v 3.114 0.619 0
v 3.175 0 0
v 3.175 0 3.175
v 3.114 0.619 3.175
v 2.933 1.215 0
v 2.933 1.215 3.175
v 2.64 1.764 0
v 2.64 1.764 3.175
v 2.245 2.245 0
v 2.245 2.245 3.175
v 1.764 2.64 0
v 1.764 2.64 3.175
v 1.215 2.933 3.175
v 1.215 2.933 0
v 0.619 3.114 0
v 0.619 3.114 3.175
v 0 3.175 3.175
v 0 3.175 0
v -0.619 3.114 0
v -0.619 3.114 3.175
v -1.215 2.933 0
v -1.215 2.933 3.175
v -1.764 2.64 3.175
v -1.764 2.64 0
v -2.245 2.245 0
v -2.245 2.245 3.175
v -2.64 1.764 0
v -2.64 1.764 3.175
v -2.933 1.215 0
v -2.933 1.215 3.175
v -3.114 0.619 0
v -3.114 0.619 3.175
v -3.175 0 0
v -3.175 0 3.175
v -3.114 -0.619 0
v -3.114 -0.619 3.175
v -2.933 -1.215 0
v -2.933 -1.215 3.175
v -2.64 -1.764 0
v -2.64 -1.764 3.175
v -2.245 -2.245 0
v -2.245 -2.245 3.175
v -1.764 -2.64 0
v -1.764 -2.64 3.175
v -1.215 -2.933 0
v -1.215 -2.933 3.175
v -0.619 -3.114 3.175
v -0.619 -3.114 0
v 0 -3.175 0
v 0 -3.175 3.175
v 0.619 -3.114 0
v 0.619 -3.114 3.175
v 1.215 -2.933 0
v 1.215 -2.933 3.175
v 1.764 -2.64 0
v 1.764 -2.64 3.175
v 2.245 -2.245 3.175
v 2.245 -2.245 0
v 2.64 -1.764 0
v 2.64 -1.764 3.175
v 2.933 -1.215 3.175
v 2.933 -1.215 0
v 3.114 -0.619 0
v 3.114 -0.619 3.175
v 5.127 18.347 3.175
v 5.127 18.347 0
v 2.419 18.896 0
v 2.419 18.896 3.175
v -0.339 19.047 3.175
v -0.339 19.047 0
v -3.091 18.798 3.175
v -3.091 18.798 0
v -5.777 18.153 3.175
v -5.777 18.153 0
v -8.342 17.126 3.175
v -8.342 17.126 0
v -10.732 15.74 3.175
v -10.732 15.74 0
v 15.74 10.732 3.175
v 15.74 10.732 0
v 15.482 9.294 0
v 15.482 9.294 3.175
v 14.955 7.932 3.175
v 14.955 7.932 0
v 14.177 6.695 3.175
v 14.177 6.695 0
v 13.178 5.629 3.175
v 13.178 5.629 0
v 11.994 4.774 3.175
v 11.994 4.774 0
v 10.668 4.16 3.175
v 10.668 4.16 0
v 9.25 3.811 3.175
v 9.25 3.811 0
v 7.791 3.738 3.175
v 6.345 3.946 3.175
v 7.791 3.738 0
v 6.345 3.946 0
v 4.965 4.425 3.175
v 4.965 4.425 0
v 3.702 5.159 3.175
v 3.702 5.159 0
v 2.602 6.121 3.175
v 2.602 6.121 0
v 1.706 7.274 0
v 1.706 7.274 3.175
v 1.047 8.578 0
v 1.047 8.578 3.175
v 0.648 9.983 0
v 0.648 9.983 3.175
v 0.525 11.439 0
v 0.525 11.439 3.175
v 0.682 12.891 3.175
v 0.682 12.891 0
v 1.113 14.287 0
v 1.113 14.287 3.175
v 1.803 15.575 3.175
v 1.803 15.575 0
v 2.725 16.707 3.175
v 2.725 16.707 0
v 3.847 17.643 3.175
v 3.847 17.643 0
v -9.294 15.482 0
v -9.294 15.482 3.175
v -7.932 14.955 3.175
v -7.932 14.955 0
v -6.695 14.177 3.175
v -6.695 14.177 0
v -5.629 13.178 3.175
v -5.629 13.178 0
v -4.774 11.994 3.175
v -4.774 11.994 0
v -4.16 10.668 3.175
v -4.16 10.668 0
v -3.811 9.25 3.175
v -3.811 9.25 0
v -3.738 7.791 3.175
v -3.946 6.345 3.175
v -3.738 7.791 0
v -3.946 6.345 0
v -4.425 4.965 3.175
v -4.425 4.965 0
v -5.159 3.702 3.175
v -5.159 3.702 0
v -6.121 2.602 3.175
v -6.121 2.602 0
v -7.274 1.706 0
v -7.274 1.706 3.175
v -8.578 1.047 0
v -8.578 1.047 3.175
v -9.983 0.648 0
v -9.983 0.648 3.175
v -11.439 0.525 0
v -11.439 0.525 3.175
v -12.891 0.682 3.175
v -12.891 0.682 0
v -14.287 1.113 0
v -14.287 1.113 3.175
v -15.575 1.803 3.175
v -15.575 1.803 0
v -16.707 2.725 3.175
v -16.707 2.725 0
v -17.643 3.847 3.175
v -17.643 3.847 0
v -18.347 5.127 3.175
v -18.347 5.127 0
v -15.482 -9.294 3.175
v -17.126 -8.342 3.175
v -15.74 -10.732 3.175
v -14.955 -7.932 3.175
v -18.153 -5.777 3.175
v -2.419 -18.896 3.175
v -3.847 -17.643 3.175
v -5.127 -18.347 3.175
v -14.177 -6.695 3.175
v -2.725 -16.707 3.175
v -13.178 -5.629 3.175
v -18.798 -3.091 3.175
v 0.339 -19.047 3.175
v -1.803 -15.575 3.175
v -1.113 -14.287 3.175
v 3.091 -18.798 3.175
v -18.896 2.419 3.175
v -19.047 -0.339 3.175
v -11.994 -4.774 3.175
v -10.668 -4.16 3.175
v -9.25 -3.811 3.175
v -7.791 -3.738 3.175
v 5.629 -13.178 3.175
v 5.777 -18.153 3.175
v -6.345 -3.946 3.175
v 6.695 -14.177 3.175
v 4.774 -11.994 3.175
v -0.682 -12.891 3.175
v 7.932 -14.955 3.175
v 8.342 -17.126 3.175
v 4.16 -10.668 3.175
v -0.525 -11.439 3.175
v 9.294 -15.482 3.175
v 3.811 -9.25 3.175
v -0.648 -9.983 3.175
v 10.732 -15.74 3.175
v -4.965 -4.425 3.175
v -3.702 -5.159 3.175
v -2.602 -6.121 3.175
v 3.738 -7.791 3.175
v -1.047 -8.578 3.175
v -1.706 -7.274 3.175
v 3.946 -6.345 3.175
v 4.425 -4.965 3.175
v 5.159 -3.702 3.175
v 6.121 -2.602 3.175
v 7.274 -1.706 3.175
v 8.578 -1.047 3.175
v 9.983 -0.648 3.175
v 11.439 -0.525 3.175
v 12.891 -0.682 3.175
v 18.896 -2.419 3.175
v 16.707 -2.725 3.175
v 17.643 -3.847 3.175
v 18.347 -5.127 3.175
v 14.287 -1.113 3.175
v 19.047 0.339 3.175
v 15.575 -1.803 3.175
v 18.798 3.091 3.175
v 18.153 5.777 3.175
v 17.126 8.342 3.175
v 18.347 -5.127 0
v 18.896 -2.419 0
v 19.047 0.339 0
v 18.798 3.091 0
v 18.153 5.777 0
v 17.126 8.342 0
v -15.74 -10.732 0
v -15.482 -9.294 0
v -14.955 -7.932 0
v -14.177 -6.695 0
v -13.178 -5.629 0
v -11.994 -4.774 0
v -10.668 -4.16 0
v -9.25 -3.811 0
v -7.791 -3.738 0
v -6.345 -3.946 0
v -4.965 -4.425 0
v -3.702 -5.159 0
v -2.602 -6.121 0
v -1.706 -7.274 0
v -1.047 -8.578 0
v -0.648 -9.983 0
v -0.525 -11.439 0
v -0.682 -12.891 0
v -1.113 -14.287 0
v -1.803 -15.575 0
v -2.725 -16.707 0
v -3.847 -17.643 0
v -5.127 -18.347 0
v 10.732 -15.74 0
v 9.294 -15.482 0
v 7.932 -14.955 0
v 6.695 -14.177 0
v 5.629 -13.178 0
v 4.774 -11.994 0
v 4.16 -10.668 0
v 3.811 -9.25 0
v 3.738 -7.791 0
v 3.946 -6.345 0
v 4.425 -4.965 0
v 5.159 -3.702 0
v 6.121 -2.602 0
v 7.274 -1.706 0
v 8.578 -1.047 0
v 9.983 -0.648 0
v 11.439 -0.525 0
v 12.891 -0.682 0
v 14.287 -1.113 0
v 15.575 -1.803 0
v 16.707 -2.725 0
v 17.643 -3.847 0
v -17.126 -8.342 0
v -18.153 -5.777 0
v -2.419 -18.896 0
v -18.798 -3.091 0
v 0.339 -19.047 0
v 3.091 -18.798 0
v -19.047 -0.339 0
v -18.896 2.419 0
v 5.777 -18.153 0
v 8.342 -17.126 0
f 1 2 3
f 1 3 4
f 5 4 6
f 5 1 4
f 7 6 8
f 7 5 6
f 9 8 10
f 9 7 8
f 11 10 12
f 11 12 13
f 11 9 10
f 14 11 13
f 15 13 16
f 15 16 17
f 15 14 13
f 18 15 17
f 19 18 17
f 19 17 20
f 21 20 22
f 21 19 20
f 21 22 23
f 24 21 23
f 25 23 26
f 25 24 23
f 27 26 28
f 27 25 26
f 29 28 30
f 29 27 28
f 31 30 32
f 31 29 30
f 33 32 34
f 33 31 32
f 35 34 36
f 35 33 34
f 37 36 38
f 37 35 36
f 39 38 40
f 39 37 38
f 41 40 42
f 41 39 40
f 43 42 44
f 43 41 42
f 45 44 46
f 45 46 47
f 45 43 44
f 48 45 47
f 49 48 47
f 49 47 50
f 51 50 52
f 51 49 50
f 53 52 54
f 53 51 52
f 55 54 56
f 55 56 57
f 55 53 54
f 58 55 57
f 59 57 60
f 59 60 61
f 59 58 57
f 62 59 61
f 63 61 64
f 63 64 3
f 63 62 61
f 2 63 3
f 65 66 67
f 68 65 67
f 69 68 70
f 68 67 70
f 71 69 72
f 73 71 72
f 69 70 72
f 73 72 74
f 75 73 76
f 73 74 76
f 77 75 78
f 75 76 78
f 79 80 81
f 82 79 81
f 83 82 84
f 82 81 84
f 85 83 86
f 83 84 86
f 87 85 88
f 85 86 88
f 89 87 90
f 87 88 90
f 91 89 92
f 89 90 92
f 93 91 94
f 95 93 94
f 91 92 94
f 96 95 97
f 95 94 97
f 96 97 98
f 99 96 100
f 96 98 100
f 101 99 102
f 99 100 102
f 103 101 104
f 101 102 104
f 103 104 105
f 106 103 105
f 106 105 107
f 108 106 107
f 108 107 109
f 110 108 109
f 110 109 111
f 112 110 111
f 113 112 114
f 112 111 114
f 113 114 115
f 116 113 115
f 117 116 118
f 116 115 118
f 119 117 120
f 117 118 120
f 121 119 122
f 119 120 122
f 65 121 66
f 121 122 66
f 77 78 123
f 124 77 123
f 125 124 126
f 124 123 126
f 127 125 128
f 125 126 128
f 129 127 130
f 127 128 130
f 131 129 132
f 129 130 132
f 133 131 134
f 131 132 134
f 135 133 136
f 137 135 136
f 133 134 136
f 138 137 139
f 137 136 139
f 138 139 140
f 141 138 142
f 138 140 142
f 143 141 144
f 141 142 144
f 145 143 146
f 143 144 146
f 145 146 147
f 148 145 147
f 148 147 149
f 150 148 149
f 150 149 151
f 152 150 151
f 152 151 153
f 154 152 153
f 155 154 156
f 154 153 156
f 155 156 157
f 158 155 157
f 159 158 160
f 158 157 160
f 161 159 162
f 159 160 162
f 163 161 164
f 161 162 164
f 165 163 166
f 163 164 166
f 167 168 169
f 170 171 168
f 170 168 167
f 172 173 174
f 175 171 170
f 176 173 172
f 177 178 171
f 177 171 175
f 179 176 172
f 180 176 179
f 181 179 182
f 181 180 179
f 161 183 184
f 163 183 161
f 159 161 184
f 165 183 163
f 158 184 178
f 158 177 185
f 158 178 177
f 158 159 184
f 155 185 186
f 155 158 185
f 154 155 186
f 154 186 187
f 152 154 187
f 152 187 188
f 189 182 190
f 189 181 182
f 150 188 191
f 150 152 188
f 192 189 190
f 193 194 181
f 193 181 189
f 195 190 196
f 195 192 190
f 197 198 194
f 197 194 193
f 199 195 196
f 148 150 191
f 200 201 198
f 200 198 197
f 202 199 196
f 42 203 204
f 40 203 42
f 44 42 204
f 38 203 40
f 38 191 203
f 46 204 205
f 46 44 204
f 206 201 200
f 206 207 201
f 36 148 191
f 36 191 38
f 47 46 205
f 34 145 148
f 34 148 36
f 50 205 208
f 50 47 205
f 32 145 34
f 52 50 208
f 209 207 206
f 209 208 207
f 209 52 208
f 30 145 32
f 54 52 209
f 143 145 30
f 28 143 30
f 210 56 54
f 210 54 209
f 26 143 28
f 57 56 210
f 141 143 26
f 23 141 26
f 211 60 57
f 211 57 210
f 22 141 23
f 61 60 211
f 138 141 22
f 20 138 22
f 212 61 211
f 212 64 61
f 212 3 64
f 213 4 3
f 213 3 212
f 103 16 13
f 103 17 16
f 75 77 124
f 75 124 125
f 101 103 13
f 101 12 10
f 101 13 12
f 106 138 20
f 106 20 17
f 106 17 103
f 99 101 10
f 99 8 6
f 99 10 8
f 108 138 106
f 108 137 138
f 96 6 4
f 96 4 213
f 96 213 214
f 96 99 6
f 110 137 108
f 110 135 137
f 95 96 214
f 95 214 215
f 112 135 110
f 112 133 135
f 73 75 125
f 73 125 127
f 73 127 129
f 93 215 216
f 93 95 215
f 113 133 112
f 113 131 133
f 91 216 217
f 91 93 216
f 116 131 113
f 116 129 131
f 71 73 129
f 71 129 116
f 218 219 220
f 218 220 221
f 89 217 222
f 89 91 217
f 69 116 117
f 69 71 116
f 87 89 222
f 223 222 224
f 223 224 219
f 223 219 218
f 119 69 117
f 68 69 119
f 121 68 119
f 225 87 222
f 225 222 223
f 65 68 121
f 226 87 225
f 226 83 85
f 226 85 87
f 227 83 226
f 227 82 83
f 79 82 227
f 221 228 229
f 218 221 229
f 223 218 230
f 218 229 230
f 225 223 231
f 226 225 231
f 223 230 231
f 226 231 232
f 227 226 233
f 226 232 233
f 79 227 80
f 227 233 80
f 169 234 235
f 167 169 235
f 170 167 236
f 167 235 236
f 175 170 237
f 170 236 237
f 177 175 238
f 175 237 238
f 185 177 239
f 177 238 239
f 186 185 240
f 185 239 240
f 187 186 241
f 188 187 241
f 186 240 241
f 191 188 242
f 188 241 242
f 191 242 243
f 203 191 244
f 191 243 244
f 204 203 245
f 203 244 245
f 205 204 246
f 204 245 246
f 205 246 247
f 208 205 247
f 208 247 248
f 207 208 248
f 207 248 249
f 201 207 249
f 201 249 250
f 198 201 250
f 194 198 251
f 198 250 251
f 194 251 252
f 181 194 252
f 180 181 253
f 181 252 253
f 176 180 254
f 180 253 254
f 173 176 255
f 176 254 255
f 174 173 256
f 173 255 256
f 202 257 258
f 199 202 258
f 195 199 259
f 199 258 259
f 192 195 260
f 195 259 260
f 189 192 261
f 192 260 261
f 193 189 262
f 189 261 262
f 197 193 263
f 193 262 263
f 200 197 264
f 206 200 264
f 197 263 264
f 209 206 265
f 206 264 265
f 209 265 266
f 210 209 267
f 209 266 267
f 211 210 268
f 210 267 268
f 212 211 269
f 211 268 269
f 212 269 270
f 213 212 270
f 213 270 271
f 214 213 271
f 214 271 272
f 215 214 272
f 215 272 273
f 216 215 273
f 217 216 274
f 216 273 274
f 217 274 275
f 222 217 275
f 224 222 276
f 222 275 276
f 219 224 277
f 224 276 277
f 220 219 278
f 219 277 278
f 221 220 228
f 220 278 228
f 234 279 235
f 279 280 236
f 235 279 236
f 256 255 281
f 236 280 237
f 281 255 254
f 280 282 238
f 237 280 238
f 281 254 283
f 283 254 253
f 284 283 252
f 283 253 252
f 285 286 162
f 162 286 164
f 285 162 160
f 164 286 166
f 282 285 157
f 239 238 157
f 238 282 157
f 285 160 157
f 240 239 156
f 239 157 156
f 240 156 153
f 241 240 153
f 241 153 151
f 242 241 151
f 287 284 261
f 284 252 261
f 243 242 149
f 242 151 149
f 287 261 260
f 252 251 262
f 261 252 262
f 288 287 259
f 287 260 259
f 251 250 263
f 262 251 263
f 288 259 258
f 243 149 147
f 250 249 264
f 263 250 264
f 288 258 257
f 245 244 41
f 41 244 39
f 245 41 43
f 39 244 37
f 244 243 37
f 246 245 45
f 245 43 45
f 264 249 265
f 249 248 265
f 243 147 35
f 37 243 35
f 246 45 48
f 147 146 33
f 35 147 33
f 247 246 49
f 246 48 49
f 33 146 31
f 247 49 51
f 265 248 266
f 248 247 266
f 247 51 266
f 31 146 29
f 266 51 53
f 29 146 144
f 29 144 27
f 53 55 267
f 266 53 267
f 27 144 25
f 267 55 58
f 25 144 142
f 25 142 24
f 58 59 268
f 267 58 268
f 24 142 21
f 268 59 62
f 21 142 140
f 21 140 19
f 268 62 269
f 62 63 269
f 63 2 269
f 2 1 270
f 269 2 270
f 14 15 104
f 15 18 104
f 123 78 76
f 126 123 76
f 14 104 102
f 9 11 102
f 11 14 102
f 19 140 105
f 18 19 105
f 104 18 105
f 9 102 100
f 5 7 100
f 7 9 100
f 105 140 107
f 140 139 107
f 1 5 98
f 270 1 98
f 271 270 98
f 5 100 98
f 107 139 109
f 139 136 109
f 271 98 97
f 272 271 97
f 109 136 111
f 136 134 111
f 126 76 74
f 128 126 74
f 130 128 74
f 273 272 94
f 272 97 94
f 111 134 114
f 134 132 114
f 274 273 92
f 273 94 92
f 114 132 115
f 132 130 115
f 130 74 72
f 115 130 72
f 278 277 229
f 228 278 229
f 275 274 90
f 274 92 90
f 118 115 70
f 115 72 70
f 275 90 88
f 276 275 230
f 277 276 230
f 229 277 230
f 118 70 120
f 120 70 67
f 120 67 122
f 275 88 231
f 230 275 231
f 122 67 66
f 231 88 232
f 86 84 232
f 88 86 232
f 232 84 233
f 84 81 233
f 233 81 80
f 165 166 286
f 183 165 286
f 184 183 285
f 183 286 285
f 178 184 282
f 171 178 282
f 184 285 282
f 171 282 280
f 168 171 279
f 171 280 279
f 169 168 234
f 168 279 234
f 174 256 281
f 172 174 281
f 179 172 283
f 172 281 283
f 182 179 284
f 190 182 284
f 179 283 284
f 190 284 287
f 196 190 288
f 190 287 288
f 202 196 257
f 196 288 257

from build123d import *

# Parameters (mm, degrees)
SKETCH1_R           = 3.175
BOSS_EXTRUDE1_DEPTH = 3.175


with BuildPart() as part:
    # Sketch1 → Boss-Extrude1 (new body)
    with BuildSketch(Plane.XY):
        with BuildLine():
            ThreePointArc((-18.347125171, 5.126938458), (-18.797583349, -3.090851056), (-15.739512715, -10.731739817))
            ThreePointArc((-15.739512715, -10.731739817), (-3.702112305, -5.159153466), (-5.126938458, -18.347125171))
            ThreePointArc((-5.126938458, -18.347125171), (3.090851056, -18.797583349), (10.731739817, -15.739512715))
            ThreePointArc((10.731739817, -15.739512715), (5.159153466, -3.702112305), (18.347125171, -5.126938458))
            ThreePointArc((18.347125171, -5.126938458), (18.797583349, 3.090851056), (15.739512715, 10.731739817))
            ThreePointArc((15.739512715, 10.731739817), (3.702112305, 5.159153466), (5.126938458, 18.347125171))
            ThreePointArc((5.126938458, 18.347125171), (-3.090851056, 18.797583349), (-10.731739817, 15.739512715))
            ThreePointArc((-10.731739817, 15.739512715), (-5.159153466, 3.702112305), (-18.347125171, 5.126938458))
        make_face()
        Circle(SKETCH1_R, mode=Mode.SUBTRACT)
    extrude(amount=BOSS_EXTRUDE1_DEPTH)


solid = part.part
